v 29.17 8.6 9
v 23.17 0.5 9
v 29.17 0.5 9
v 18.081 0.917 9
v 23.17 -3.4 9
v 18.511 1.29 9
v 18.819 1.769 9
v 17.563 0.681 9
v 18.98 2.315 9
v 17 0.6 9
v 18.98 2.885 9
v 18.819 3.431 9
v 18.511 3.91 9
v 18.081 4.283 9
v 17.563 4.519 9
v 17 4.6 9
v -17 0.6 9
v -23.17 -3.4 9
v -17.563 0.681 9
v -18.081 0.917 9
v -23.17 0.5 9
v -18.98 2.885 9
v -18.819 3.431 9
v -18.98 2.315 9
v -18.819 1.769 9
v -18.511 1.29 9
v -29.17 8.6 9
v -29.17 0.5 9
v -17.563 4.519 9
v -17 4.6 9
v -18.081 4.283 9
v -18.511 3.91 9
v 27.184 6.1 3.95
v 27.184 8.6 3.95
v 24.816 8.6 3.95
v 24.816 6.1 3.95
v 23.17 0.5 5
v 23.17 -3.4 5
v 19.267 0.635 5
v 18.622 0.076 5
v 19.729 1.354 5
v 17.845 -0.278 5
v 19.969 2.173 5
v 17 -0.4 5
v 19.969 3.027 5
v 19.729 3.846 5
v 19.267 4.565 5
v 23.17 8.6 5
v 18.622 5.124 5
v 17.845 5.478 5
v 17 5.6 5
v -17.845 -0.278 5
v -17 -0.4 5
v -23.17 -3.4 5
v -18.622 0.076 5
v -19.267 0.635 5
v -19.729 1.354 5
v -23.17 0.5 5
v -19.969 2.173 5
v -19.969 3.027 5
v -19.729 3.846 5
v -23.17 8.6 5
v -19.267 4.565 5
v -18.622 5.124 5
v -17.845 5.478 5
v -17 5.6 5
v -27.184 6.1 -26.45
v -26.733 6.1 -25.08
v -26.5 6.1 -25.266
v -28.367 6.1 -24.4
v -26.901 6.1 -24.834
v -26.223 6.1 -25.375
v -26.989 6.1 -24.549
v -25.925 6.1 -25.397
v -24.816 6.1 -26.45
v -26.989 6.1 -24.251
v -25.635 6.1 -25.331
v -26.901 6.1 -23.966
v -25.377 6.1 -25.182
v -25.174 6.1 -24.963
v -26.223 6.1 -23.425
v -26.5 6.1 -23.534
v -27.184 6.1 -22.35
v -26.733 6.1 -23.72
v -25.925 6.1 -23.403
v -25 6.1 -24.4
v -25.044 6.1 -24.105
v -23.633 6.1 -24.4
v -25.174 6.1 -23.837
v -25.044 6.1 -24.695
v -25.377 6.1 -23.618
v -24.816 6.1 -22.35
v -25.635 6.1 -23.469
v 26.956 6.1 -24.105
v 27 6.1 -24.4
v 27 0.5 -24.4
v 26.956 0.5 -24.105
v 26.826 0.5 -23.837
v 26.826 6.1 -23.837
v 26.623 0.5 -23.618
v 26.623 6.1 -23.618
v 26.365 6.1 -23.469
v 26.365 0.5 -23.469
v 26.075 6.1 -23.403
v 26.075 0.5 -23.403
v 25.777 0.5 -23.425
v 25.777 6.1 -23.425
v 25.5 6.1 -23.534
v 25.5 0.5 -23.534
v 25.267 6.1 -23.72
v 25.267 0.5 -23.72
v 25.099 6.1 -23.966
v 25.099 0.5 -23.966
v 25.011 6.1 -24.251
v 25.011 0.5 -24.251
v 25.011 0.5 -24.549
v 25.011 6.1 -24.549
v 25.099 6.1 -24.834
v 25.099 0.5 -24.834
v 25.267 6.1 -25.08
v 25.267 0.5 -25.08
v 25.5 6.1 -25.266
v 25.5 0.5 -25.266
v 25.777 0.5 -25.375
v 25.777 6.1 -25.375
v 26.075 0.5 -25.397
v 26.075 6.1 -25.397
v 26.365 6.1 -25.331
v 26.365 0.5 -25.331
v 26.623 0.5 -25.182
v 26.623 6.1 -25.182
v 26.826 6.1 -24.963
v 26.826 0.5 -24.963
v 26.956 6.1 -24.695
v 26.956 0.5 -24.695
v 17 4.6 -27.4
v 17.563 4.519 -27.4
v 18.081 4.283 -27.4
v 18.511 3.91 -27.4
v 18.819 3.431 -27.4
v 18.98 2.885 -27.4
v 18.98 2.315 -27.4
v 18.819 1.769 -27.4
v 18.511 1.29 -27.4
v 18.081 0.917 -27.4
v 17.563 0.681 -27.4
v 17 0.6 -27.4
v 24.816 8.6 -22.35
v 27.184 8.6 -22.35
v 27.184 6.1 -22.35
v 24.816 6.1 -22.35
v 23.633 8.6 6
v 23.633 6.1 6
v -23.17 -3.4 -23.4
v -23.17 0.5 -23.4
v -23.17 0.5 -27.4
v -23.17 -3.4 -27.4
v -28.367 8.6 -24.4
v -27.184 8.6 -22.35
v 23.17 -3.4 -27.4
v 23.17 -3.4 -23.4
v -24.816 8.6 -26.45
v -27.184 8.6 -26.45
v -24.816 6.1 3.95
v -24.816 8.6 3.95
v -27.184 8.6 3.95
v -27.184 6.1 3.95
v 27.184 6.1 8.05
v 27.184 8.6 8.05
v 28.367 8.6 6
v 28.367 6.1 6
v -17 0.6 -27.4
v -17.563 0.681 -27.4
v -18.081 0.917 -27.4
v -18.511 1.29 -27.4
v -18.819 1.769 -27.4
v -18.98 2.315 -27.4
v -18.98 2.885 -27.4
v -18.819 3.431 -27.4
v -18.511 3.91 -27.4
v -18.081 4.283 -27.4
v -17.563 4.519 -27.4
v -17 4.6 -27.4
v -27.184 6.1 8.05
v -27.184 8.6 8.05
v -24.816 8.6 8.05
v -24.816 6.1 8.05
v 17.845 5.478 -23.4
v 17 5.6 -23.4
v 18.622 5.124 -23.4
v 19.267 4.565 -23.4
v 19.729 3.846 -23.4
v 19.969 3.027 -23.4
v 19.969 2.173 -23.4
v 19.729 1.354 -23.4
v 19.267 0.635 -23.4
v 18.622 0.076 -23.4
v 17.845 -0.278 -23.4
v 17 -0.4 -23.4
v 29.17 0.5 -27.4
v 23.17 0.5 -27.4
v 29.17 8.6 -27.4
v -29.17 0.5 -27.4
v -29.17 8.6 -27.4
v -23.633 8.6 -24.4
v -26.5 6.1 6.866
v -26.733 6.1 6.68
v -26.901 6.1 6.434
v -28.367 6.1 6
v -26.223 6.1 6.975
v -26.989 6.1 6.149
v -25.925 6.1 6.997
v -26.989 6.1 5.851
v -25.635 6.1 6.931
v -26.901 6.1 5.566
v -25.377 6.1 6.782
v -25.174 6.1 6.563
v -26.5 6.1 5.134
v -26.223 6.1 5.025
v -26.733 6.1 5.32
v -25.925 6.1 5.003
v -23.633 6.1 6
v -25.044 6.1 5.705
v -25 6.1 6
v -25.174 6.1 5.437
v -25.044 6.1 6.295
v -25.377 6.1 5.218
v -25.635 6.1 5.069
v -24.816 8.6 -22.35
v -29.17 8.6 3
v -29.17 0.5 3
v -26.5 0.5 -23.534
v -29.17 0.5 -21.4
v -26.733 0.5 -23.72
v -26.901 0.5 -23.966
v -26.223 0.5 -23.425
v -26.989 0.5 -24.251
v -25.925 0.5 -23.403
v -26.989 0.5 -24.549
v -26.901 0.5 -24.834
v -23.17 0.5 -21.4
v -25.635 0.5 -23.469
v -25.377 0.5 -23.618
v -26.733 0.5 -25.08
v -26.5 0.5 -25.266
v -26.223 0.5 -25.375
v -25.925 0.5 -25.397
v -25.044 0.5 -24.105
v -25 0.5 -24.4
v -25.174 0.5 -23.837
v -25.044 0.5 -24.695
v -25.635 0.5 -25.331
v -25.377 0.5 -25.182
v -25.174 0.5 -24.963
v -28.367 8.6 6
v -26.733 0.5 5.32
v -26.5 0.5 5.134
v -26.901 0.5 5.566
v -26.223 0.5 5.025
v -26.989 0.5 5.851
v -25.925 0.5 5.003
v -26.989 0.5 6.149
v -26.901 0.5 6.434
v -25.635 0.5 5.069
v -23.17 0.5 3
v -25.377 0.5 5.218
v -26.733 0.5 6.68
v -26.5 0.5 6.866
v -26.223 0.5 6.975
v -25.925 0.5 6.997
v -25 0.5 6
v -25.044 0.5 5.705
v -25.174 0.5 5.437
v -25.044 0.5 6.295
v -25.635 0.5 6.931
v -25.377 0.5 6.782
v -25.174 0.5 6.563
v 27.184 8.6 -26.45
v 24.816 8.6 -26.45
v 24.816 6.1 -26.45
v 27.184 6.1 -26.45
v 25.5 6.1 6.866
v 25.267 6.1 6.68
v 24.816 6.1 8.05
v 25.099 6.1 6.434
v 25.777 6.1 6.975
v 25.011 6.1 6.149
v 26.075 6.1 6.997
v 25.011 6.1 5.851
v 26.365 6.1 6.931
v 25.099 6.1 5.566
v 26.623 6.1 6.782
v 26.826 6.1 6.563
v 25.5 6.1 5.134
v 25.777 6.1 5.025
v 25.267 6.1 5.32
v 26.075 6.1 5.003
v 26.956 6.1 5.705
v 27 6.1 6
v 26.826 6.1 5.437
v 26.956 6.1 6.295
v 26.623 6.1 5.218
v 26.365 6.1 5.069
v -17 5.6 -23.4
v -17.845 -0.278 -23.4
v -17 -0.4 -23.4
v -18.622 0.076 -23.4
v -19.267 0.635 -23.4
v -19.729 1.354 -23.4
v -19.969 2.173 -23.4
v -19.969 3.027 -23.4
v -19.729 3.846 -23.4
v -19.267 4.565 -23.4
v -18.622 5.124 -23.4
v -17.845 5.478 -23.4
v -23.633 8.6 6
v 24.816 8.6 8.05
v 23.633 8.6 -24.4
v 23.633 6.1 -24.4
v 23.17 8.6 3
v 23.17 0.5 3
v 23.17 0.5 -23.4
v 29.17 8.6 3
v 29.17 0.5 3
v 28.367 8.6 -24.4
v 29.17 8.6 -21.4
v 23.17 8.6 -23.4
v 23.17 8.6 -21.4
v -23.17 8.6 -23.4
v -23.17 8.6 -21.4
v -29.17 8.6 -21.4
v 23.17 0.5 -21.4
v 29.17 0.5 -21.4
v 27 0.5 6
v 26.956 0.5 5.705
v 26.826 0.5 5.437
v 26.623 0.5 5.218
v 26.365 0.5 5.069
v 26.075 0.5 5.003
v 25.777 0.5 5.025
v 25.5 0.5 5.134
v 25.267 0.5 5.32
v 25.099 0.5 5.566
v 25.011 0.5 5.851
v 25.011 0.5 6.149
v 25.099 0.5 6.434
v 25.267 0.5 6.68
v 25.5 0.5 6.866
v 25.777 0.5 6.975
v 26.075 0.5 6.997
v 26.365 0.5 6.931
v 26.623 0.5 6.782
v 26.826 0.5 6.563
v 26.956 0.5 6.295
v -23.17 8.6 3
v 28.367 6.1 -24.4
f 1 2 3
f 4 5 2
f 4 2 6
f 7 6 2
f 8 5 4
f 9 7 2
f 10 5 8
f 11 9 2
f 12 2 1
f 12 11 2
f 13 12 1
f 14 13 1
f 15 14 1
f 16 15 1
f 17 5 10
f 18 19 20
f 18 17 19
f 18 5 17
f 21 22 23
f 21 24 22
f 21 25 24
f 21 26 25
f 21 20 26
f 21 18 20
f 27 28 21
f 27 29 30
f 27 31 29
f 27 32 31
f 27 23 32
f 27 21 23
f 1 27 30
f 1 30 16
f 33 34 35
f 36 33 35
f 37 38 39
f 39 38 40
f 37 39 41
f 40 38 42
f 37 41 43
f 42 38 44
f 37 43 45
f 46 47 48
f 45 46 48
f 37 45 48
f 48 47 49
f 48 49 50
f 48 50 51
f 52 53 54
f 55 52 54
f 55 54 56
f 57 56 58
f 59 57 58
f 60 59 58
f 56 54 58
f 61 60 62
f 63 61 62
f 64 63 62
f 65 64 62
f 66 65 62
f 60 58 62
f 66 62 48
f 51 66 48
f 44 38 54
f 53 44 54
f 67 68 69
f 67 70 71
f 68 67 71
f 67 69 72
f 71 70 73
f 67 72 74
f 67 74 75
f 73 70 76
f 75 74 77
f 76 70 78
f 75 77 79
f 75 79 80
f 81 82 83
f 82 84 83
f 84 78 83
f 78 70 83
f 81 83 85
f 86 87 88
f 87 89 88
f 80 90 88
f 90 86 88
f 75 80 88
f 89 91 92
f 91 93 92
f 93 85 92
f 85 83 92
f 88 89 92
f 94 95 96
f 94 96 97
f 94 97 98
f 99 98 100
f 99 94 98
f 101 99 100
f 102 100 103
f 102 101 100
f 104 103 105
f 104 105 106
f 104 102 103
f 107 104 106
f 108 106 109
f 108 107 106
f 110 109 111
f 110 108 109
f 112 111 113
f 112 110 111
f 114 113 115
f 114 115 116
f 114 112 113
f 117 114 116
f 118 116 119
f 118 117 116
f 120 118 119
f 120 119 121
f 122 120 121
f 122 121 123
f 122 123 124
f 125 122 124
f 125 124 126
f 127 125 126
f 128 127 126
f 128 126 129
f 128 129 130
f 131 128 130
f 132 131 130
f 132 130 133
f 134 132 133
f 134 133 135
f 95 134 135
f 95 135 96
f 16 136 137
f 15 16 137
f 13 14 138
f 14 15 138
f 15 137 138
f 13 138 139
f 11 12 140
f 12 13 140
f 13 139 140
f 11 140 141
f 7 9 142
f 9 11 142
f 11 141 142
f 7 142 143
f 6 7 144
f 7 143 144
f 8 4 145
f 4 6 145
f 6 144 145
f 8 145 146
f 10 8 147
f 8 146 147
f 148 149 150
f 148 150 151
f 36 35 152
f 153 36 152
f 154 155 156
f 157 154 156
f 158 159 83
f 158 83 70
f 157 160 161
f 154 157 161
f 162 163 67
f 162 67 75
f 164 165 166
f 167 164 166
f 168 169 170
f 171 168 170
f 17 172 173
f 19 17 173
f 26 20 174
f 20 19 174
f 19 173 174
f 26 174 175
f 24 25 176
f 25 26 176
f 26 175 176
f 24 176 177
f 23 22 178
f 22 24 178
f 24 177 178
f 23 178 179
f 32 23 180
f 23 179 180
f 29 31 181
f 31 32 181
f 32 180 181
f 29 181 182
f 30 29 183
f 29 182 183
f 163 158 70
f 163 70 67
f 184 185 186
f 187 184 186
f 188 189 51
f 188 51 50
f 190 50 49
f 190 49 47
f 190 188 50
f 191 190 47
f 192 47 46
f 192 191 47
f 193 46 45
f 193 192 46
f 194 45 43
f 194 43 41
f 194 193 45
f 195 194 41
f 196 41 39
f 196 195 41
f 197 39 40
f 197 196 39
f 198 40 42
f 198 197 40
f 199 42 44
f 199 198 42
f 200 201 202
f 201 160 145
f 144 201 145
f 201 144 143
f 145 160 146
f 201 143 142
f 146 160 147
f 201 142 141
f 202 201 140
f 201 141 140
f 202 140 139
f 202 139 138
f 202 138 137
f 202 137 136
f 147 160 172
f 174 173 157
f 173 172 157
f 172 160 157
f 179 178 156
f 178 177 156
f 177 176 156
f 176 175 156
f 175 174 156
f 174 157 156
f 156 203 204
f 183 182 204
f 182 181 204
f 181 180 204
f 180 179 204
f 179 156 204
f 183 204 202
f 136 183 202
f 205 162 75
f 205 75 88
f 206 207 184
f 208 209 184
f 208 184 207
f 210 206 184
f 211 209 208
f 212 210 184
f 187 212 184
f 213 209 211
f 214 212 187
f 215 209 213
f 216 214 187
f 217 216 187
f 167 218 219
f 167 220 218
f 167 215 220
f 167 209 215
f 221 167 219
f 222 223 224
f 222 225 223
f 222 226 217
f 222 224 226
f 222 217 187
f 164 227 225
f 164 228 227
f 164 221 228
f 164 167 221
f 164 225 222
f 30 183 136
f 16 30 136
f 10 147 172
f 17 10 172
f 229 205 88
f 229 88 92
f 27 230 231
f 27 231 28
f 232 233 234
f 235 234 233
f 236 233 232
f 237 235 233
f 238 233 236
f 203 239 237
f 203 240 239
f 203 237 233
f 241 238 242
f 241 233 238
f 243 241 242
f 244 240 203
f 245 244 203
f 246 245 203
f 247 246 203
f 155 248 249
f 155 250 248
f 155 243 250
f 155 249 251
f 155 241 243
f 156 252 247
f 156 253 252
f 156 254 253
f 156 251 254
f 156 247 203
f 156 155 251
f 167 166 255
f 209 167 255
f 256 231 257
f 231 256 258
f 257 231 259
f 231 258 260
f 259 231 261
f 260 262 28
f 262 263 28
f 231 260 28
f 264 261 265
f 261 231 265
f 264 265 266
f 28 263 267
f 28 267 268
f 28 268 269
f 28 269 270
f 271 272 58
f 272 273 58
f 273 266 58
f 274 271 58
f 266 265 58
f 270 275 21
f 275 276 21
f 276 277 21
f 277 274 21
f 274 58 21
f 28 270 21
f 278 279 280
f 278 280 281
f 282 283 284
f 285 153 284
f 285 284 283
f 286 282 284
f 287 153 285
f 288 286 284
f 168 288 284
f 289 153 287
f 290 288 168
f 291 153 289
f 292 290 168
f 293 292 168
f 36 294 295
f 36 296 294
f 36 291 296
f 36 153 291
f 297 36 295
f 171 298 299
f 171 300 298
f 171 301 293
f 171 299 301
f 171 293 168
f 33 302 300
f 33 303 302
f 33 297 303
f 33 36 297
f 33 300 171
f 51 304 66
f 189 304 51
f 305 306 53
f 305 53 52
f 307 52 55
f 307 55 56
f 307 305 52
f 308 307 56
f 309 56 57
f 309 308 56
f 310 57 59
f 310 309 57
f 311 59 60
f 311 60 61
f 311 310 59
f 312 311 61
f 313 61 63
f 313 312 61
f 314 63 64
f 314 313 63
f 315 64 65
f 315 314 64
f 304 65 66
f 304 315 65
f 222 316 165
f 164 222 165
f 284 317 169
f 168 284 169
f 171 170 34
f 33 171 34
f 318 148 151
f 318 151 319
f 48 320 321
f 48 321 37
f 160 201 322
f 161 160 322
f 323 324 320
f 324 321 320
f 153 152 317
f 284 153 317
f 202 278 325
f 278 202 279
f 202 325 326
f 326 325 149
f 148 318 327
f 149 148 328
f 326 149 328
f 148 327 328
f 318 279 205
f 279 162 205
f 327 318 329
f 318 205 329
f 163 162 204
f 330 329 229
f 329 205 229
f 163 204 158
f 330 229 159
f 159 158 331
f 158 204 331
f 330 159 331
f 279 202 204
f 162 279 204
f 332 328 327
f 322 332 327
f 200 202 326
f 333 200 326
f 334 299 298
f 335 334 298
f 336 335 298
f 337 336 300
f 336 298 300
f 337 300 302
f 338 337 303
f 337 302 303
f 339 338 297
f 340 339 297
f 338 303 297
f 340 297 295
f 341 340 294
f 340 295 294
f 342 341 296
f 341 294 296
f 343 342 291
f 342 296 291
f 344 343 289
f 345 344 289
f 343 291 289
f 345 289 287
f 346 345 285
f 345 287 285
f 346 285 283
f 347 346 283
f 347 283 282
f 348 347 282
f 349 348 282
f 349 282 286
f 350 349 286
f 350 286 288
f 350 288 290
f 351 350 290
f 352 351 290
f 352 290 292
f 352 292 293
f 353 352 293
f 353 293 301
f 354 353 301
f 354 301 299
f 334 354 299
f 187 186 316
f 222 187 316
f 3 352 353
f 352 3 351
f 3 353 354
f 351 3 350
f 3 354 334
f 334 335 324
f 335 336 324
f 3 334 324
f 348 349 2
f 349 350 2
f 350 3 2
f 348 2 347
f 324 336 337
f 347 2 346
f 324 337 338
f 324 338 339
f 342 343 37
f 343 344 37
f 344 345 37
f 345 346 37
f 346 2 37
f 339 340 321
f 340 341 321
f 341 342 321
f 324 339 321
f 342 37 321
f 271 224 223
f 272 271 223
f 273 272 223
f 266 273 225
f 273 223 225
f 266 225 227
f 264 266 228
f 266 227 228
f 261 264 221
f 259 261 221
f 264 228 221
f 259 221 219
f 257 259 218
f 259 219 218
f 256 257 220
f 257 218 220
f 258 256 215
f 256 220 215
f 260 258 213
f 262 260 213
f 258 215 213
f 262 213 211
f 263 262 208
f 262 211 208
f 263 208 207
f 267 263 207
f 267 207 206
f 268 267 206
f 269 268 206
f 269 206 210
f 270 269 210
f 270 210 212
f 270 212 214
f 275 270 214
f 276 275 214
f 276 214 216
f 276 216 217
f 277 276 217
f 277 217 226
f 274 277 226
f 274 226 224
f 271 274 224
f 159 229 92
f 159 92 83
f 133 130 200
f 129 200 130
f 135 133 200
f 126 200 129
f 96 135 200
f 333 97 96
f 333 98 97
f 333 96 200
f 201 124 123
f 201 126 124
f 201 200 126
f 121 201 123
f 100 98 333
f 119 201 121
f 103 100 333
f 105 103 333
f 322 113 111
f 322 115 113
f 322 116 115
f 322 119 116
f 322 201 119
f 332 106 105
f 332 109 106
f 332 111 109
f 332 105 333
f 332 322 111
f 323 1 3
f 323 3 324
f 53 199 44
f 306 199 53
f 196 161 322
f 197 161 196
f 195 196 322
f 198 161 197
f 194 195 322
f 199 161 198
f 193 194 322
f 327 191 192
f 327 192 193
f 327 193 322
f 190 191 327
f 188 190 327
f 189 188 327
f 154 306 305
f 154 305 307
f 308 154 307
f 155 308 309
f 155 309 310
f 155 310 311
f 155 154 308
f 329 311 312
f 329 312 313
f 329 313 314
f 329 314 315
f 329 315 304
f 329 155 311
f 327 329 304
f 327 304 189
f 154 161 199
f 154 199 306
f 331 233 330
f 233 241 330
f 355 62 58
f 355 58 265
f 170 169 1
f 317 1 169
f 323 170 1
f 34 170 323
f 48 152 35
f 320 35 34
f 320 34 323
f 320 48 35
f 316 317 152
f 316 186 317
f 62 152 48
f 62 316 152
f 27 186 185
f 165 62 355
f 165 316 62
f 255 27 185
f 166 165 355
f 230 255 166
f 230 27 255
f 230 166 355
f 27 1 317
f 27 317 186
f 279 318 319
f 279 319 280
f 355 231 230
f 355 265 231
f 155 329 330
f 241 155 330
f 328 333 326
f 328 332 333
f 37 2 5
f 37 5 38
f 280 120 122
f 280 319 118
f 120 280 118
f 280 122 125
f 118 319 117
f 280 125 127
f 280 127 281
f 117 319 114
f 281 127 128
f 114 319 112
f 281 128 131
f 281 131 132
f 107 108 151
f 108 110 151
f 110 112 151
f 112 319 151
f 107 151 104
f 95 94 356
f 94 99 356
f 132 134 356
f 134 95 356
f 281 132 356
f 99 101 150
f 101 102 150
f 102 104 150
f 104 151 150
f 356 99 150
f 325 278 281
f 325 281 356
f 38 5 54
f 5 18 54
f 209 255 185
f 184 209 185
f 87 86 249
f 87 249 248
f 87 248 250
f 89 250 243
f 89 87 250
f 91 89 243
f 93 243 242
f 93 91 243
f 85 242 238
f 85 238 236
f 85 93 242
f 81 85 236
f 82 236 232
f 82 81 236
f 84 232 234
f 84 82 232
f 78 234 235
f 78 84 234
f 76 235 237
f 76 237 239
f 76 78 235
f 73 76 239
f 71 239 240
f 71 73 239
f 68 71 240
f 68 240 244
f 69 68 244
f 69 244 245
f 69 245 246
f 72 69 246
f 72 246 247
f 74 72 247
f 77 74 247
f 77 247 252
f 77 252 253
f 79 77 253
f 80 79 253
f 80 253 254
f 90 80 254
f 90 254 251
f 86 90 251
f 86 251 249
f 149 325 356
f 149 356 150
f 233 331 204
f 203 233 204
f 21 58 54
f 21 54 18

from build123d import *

# Parameters (mm, degrees)
ESBO_O1_W                 = 58
ESBO_O1_H                 = 6
RESSALTO_EXTRUS_O1_DEPTH  = 8.6
ESBO_O2_W                 = 47.9
ESBO_O2_H                 = 6
RESSALTO_EXTRUS_O2_DEPTH  = 3.4
CORTE_EXTRUS_O2_DEPTH     = 7
ESBO_O8_W                 = 5.05
ESBO_O8_H                 = 6
CORTE_EXTRUS_O3_DEPTH     = 0.5
ESBO_O9_W                 = 46
ESBO_O9_H                 = 2
CORTE_EXTRUS_O4_DEPTH     = 8.1
ESBO_O10_W                = 47.9
ESBO_O10_H                = 2
CORTE_EXTRUS_O5_DEPTH     = 3.9
ESBO_O11_W                = 0.95
ESBO_O11_H                = 4
CORTE_EXTRUS_O6_DEPTH     = 4.9
ESBO_O15_W                = 4
ESBO_O15_H                = 3.9
RESSALTO_EXTRUS_O4_DEPTH  = 0.17
ESBO_O16_R                = 1
CORTE_EXTRUS_O9_DEPTH     = 2.5
ESBO_O16_4_R              = 1
CORTE_EXTRUS_O10_DEPTH    = 13
RESSALTO_EXTRUS_O5_DEPTH  = 14.2
ESBO_O18_W                = 2
ESBO_O18_H                = 8.1
CORTE_EXTRUS_O11_DEPTH    = 0.17
ESBO_O19_W                = 2
ESBO_O19_H                = 8.1
CORTE_EXTRUS_O12_DEPTH    = 0.17
ESBO_O20_W                = 4
ESBO_O20_H                = 3.9
RESSALTO_EXTRUS_O6_DEPTH  = 0.17
ESBO_O23_W                = 6
ESBO_O23_H                = 8.1
RESSALTO_EXTRUS_O9_DEPTH  = 0.17
ESBO_O24_W                = 6
ESBO_O24_H                = 8.1
RESSALTO_EXTRUS_O10_DEPTH = 0.17


with BuildPart() as part:
    # Esboço1 → Ressalto-extrusão1 (new body)
    with BuildSketch(Plane(origin=(0, 0, 0), x_dir=(1, 0, 0), z_dir=(0, 1, 0))):
        Rectangle(ESBO_O1_W, ESBO_O1_H)
    extrude(amount=RESSALTO_EXTRUS_O1_DEPTH)

    # Esboço2 → Ressalto-extrusão2 (add)
    with BuildSketch(Plane.XZ):
        Rectangle(ESBO_O2_W, ESBO_O2_H)
    extrude(amount=RESSALTO_EXTRUS_O2_DEPTH)

    # Esboço4 → Corte-extrusão2 (cut, through all)
    with BuildSketch(Plane.XY.offset(3)):
        with BuildLine():
            Line((-17, 4.6), (17, 4.6))
            ThreePointArc((17, 4.6), (19, 2.6), (17, 0.6))
            Line((17, 0.6), (-17, 0.6))
            ThreePointArc((-17, 0.6), (-19, 2.6), (-17, 4.6))
        make_face()
    extrude(amount=-CORTE_EXTRUS_O2_DEPTH, mode=Mode.SUBTRACT)


with BuildPart() as body_2:
    # Espelhar1: mirrored copy
    add(part.part.mirror(Plane(origin=(-29, 8.6, 3), x_dir=(1, 0, 0), z_dir=(0, 0, -1))))

    # Esboço8 → Corte-extrusão3 (cut)
    with BuildSketch(Plane.XZ):
        with Locations((-26.475, 6)):
            Rectangle(ESBO_O8_W, ESBO_O8_H)
        with Locations((26.475, 6)):
            Rectangle(ESBO_O8_W, ESBO_O8_H)
    extrude(amount=-CORTE_EXTRUS_O3_DEPTH, mode=Mode.SUBTRACT)

    # Esboço9 → Corte-extrusão4 (cut)
    with BuildSketch(Plane(origin=(0, 8.6, 0), x_dir=(1, 0, 0), z_dir=(0, 1, 0))):
        with Locations((0, -4)):
            Rectangle(ESBO_O9_W, ESBO_O9_H)
    extrude(amount=-CORTE_EXTRUS_O4_DEPTH, mode=Mode.SUBTRACT)

    # Esboço10 → Corte-extrusão5 (cut)
    with BuildSketch(Plane.XZ.offset(3.4)):
        with Locations((0, 4)):
            Rectangle(ESBO_O10_W, ESBO_O10_H)
    extrude(amount=-CORTE_EXTRUS_O5_DEPTH, mode=Mode.SUBTRACT)

    # Esboço11 → Corte-extrusão6 (cut, through all)
    with BuildSketch(Plane.XZ.offset(-0.5)):
        with Locations((23.475, 7)):
            Rectangle(ESBO_O11_W, ESBO_O11_H)
        with Locations((-23.475, 7)):
            Rectangle(ESBO_O11_W, ESBO_O11_H)
    extrude(amount=CORTE_EXTRUS_O6_DEPTH, mode=Mode.SUBTRACT)

    # Esboço15 → Ressalto-extrusão4 (add)
    with BuildSketch(Plane.ZY.offset(23)):
        with Locations((7, -1.45)):
            Rectangle(ESBO_O15_W, ESBO_O15_H)
    extrude(amount=RESSALTO_EXTRUS_O4_DEPTH)

    # Esboço16 → Corte-extrusão9 (cut)
    with BuildSketch(Plane(origin=(0, 8.6, 0), x_dir=(1, 0, 0), z_dir=(0, 1, 0))):
        with Locations((26, -6)):
            Circle(ESBO_O16_R)
        Polygon((27.183568052, -3.95), (24.816431948, -3.95), (23.632863896, -6), (24.816431948, -8.05), (27.183568052, -8.05), (28.367136104, -6), align=None)
        with Locations((26, -6)):
            Circle(ESBO_O16_R, mode=Mode.SUBTRACT)
        Polygon((-24.816431948, -3.95), (-27.183568052, -3.95), (-28.367136104, -6), (-27.183568052, -8.05), (-24.816431948, -8.05), (-23.632863896, -6), align=None)
        with Locations((-26, -6)):
            Circle(ESBO_O16_R, mode=Mode.SUBTRACT)
        with Locations((-26, -6)):
            Circle(ESBO_O16_R)
    extrude(amount=-CORTE_EXTRUS_O9_DEPTH, mode=Mode.SUBTRACT)

    # Esboço16<4> → Corte-extrusão10 (cut, through all)
    with BuildSketch(Plane(origin=(0, 8.6, 0), x_dir=(1, 0, 0), z_dir=(0, 1, 0))):
        with Locations((26, -6)):
            Circle(ESBO_O16_4_R)
        with Locations((-26, -6)):
            Circle(ESBO_O16_4_R)
    extrude(amount=-CORTE_EXTRUS_O10_DEPTH, mode=Mode.SUBTRACT)

    # Esboço17 → Ressalto-extrusão5 (add)
    with BuildSketch(Plane(origin=(0, 0, 5), x_dir=(-1, 0, 0), z_dir=(0, 0, -1))):
        with BuildLine():
            Line((17, 5.6), (-17, 5.6))
            ThreePointArc((-17, 5.6), (-20, 2.6), (-17, -0.4))
            Line((-17, -0.4), (17, -0.4))
            ThreePointArc((17, -0.4), (20, 2.6), (17, 5.6))
        make_face()
        with BuildLine():
            Line((-17, 0.6), (17, 0.6))
            ThreePointArc((17, 0.6), (19, 2.6), (17, 4.6))
            Line((17, 4.6), (-17, 4.6))
            ThreePointArc((-17, 4.6), (-19, 2.6), (-17, 0.6))
        make_face(mode=Mode.SUBTRACT)
    extrude(amount=RESSALTO_EXTRUS_O5_DEPTH)

    # Esboço18 → Corte-extrusão11 (cut)
    with BuildSketch(Plane(origin=(-23, 0, 0), x_dir=(0, 0, -1), z_dir=(1, 0, 0))):
        with Locations((-4, 4.55)):
            Rectangle(ESBO_O18_W, ESBO_O18_H)
    extrude(amount=-CORTE_EXTRUS_O11_DEPTH, mode=Mode.SUBTRACT)

    # Esboço19 → Corte-extrusão12 (cut)
    with BuildSketch(Plane.ZY.offset(-23)):
        with Locations((4, 4.55)):
            Rectangle(ESBO_O19_W, ESBO_O19_H)
    extrude(amount=-CORTE_EXTRUS_O12_DEPTH, mode=Mode.SUBTRACT)

    # Esboço20 → Ressalto-extrusão6 (add)
    with BuildSketch(Plane(origin=(23, 0, 0), x_dir=(0, 0, -1), z_dir=(1, 0, 0))):
        with Locations((-7, -1.45)):
            Rectangle(ESBO_O20_W, ESBO_O20_H)
    extrude(amount=RESSALTO_EXTRUS_O6_DEPTH)

    # Esboço23 → Ressalto-extrusão9 (add)
    with BuildSketch(Plane.ZY.offset(29)):
        with Locations((6, 4.55)):
            Rectangle(ESBO_O23_W, ESBO_O23_H)
    extrude(amount=RESSALTO_EXTRUS_O9_DEPTH)

    # Esboço24 → Ressalto-extrusão10 (add)
    with BuildSketch(Plane(origin=(29, 0, 0), x_dir=(0, 0, -1), z_dir=(1, 0, 0))):
        with Locations((-6, 4.55)):
            Rectangle(ESBO_O24_W, ESBO_O24_H)
    extrude(amount=RESSALTO_EXTRUS_O10_DEPTH)

    # Espelhar2: body 2 across plane


with BuildPart() as body_2_1:
    add(body_2.part)
    add(body_2.part.mirror(Plane(origin=(-17, 2.6, -9.2), x_dir=(1, 0, 0), z_dir=(0, 0, -1))))


solid = body_2_1.part
